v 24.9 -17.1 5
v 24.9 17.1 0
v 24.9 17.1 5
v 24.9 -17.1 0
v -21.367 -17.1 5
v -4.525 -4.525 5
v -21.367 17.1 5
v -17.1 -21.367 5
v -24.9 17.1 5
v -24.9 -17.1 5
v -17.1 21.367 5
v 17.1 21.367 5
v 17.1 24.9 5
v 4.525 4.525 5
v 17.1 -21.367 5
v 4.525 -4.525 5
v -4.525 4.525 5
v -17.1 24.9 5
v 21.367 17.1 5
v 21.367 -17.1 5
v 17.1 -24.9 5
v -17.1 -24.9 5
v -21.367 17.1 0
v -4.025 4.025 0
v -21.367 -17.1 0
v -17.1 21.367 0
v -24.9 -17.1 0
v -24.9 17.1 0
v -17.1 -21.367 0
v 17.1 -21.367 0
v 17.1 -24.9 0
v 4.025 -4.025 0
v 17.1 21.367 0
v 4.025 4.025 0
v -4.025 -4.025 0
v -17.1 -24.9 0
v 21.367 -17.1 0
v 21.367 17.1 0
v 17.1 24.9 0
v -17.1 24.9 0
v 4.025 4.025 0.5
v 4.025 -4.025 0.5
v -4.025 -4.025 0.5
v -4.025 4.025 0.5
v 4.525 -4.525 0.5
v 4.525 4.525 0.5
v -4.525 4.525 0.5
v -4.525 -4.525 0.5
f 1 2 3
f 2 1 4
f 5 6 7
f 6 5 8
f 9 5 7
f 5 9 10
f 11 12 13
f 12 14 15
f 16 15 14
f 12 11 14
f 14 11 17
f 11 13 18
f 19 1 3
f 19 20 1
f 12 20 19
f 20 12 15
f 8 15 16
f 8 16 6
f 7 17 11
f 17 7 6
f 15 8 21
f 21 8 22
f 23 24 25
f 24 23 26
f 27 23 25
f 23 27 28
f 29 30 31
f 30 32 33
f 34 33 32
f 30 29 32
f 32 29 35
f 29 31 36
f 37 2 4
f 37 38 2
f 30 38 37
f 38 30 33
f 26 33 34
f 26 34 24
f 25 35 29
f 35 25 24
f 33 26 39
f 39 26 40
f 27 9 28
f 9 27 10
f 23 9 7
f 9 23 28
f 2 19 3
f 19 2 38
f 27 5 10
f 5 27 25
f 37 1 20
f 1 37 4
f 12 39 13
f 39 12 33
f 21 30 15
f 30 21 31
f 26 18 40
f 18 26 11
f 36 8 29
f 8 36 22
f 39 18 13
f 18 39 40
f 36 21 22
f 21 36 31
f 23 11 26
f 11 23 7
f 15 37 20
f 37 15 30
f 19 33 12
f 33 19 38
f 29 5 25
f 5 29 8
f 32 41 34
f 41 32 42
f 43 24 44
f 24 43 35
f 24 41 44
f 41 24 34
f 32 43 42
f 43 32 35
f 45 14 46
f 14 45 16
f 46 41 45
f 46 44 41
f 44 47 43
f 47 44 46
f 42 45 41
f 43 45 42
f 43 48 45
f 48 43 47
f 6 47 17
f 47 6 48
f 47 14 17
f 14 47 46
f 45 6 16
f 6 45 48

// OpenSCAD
//Cube with walls insert template

IM_offset = 0.3;

a = 49.8;
b = 33.6;
c = 6.28;
d = 53.8;
h = 5; //holder height

hole_w = 8.45;
hole_l = 8.45;

step_w = 1;
step_h = 0.5;

module CubeInsert () {
    translate([0,0,h/2])
    difference(){
        union() {   //basic insert design
            cube([a,b+2*IM_offset,h], center=true);
            cube([b+2*IM_offset,a,h], center=true);
            rotate(a=[0,0,45]){
                cube([c,d+2*IM_offset,h], center=true);
            }
            rotate(a=[0,0,-45]){
                cube([c,d+2*IM_offset,h], center=true);
            }
        }
    }
}


module CLensInsert () {
    difference() {
        CubeInsert();
        translate([-(hole_w-step_w+2*IM_offset)/2,-(hole_l-step_w+2*IM_offset)/2,0])
            cube([hole_w-step_w+2*IM_offset,hole_l-step_w+2*IM_offset,20]);
        translate([-(hole_w+2*IM_offset)/2,-(hole_l+2*IM_offset)/2,step_h])
            cube([hole_w+2*IM_offset,hole_l+2*IM_offset,20]);
    }
}

CLensInsert();
